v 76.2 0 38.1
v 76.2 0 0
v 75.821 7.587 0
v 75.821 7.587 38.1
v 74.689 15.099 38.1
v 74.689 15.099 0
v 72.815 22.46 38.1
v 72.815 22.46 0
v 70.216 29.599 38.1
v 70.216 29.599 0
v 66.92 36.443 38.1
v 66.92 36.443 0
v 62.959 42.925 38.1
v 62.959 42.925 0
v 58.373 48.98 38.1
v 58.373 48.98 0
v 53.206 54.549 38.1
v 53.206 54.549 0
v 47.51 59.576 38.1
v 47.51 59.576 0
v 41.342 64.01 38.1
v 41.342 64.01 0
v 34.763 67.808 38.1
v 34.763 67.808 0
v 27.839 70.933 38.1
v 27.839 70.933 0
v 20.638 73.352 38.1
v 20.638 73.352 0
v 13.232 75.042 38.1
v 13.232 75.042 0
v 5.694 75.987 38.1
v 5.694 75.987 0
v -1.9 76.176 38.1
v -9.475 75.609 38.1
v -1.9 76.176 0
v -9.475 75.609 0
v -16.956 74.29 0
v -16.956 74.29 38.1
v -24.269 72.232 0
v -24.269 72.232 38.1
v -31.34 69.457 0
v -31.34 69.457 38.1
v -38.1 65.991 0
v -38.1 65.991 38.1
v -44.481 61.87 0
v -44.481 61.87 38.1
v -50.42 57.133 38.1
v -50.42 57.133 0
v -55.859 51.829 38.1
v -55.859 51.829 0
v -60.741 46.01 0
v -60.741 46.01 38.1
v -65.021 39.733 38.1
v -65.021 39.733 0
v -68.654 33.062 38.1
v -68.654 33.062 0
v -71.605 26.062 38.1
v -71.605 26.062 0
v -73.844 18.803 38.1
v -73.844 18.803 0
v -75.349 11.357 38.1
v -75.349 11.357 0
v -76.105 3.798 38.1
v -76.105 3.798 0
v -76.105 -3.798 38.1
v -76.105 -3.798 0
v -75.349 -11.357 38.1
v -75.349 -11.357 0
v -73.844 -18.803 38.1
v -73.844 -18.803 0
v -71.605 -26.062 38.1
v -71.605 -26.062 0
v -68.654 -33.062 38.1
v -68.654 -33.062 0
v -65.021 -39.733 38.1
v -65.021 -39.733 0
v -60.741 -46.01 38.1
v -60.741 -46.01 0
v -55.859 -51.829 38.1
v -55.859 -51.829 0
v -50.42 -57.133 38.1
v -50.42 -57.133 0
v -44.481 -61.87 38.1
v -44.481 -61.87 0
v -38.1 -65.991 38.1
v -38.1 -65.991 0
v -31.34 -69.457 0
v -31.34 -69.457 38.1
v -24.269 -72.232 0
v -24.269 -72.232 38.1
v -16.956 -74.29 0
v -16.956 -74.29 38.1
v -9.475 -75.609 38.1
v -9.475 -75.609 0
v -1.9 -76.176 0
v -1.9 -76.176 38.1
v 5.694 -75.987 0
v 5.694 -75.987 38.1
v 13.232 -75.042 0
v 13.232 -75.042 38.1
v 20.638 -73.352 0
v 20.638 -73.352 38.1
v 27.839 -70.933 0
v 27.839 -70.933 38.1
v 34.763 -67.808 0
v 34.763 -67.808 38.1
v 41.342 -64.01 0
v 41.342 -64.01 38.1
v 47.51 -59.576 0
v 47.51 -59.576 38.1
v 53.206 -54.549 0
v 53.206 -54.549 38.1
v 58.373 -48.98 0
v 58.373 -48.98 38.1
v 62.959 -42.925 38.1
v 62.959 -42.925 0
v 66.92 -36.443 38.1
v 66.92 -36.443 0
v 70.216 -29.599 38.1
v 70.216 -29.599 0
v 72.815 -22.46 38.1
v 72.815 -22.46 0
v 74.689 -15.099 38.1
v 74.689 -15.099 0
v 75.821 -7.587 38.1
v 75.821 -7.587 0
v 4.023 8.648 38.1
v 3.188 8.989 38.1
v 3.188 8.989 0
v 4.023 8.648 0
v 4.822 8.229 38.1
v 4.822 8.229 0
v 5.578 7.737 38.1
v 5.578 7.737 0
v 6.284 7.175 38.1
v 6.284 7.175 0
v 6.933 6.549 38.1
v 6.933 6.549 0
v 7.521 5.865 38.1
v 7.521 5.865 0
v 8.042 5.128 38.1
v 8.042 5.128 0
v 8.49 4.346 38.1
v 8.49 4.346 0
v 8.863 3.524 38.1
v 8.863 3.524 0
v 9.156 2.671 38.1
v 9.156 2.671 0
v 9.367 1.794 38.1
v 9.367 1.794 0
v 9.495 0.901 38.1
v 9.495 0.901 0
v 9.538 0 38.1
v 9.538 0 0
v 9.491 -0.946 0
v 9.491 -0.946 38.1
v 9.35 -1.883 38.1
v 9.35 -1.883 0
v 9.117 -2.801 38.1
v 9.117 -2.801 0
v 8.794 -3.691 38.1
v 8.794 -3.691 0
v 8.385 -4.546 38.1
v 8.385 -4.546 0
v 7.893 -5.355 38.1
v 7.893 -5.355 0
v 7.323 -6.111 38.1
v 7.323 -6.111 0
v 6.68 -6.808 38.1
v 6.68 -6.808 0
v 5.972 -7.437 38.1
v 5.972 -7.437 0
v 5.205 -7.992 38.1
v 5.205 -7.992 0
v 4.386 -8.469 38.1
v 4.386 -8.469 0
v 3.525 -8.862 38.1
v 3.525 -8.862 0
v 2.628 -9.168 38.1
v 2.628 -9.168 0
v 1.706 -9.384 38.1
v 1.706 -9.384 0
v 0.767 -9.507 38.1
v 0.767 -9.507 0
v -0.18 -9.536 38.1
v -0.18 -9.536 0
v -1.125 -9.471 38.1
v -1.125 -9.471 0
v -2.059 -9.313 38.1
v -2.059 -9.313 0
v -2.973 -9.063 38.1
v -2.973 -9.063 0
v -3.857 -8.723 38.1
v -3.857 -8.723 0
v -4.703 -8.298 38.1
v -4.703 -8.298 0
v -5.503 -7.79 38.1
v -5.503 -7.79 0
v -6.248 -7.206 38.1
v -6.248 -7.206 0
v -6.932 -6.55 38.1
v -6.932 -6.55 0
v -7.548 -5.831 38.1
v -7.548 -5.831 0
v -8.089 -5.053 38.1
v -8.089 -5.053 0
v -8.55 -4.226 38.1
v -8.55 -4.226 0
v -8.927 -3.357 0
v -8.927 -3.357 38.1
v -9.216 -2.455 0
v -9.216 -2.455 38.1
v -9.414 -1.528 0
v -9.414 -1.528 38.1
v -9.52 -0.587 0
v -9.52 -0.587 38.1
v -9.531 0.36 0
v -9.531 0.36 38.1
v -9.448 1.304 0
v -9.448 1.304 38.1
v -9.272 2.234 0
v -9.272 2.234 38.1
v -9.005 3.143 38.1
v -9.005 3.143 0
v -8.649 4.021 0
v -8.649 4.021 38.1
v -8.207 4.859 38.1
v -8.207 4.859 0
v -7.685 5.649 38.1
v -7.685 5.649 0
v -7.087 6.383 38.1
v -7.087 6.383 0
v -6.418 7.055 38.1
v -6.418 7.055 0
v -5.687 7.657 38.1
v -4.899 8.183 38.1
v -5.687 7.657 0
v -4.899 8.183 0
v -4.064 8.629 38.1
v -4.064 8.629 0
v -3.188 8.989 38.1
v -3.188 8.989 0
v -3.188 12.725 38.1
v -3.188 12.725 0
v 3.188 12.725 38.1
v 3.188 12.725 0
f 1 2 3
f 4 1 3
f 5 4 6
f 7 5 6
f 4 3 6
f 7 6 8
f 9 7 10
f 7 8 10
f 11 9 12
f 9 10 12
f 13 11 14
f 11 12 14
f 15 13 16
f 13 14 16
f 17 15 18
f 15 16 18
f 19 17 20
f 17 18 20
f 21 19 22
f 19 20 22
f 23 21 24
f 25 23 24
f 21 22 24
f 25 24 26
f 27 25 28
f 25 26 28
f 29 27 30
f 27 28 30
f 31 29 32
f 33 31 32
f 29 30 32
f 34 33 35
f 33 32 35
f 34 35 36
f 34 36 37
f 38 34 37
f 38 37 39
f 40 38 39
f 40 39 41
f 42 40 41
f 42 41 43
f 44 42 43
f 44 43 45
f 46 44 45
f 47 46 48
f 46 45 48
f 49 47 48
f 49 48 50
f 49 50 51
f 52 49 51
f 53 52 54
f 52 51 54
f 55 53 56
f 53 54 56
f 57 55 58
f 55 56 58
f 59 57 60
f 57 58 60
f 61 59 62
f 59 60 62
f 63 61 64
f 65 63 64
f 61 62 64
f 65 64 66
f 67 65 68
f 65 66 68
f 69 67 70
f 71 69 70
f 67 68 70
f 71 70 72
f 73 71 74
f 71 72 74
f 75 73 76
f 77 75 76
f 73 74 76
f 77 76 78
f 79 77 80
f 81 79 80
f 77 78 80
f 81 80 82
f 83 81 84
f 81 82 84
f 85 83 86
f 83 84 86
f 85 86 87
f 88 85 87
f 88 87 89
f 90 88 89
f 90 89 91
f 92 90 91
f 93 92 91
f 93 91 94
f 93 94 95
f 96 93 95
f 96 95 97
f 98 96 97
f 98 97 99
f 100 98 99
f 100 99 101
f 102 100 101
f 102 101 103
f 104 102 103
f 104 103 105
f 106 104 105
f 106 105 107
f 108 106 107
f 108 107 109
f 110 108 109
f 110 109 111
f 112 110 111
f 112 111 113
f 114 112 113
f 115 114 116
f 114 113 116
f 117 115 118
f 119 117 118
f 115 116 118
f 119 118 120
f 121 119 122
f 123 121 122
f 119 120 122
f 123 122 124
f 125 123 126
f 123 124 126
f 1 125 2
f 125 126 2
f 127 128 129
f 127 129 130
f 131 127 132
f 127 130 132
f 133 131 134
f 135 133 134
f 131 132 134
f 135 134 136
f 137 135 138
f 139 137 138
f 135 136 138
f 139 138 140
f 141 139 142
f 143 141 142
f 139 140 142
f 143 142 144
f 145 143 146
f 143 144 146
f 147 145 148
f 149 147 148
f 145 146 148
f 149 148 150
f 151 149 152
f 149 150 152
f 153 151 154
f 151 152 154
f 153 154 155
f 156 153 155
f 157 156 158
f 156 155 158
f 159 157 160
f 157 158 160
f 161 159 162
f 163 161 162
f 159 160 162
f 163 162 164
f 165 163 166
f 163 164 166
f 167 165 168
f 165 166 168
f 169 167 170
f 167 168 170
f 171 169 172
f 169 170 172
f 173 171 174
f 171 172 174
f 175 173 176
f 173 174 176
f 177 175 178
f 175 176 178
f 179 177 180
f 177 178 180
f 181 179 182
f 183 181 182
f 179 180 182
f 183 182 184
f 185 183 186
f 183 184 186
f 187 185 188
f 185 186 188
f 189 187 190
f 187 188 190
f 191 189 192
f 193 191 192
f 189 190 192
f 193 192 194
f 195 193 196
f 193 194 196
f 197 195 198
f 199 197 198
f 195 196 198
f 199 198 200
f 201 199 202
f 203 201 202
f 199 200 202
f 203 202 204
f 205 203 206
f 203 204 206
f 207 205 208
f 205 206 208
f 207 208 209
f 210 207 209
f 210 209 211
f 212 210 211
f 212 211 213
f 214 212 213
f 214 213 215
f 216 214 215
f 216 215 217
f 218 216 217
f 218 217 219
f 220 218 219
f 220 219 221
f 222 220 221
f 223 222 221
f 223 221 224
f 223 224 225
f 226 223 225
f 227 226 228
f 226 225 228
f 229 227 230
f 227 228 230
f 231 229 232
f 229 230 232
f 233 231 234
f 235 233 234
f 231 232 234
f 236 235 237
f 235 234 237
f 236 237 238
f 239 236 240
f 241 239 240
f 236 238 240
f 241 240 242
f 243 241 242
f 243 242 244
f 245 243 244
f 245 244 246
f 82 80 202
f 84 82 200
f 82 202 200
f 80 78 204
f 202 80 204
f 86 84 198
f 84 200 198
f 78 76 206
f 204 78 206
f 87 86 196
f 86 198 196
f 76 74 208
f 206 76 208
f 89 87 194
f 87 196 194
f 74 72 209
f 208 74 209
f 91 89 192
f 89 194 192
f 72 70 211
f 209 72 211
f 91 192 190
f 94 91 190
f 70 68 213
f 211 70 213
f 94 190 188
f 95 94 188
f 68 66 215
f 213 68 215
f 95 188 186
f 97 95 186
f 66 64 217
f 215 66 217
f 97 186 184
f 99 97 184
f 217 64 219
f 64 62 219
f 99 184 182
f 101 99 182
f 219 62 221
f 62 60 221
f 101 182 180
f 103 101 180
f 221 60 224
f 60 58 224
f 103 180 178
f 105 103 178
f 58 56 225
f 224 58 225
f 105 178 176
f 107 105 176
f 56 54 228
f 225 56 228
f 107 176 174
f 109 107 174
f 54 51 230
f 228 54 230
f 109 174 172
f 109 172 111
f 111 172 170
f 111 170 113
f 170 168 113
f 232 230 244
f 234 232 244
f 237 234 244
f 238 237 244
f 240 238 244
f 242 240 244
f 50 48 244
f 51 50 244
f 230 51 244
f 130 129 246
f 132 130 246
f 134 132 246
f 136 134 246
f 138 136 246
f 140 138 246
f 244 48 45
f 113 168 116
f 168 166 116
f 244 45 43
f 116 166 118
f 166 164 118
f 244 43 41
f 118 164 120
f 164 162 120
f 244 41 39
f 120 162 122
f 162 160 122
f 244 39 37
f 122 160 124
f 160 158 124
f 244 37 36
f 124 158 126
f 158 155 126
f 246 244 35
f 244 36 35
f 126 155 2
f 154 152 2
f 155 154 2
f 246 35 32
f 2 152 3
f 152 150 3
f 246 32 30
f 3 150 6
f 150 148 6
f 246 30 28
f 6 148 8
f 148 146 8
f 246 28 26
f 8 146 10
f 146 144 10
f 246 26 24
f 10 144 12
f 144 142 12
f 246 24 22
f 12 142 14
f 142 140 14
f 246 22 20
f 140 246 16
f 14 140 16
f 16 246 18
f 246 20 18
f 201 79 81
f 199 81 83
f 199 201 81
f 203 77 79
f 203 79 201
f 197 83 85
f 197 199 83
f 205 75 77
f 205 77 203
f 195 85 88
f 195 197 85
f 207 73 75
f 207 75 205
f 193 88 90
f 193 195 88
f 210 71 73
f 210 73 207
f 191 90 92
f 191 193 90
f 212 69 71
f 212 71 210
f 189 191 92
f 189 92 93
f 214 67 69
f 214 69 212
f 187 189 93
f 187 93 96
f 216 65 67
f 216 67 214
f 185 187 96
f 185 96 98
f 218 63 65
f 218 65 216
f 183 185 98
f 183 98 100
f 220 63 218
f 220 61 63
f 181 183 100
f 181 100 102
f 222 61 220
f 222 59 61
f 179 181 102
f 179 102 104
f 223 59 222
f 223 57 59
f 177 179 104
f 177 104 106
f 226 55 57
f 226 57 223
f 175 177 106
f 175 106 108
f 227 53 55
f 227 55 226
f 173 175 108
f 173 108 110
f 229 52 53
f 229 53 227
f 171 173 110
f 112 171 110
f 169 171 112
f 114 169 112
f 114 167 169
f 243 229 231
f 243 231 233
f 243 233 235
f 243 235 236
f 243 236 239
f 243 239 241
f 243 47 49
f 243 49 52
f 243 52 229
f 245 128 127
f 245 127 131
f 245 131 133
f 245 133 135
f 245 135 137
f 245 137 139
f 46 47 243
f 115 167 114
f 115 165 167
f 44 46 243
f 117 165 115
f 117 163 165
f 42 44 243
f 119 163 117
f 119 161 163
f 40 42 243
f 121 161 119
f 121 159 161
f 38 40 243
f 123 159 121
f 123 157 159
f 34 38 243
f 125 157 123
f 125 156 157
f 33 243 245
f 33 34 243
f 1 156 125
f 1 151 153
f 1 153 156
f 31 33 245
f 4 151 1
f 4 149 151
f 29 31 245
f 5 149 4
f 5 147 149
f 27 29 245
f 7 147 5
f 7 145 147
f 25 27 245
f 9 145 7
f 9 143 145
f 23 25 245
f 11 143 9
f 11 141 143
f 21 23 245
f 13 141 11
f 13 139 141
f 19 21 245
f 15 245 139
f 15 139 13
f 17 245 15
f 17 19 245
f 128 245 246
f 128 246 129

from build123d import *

# Parameters (mm, degrees)
SKETCH1_R           = 76.2
BOSS_EXTRUDE1_DEPTH = 38.1


with BuildPart() as part:
    # Sketch1 → Boss-Extrude1 (new body)
    with BuildSketch(Plane.XY):
        Circle(SKETCH1_R)
        with BuildLine():
            ThreePointArc((9.5377, 0), (-5.502926267, -7.790091385), (-3.1877, 8.989231892))
            Line((-3.1877, 8.989231892), (-3.1877, 12.7254))
            Line((-3.1877, 12.7254), (3.1877, 12.7254))
            Line((3.1877, 12.7254), (3.1877, 8.989231892))
            ThreePointArc((3.1877, 8.989231892), (7.790091385, 5.502926267), (9.5377, 0))
        make_face(mode=Mode.SUBTRACT)
    extrude(amount=BOSS_EXTRUDE1_DEPTH)


solid = part.part
